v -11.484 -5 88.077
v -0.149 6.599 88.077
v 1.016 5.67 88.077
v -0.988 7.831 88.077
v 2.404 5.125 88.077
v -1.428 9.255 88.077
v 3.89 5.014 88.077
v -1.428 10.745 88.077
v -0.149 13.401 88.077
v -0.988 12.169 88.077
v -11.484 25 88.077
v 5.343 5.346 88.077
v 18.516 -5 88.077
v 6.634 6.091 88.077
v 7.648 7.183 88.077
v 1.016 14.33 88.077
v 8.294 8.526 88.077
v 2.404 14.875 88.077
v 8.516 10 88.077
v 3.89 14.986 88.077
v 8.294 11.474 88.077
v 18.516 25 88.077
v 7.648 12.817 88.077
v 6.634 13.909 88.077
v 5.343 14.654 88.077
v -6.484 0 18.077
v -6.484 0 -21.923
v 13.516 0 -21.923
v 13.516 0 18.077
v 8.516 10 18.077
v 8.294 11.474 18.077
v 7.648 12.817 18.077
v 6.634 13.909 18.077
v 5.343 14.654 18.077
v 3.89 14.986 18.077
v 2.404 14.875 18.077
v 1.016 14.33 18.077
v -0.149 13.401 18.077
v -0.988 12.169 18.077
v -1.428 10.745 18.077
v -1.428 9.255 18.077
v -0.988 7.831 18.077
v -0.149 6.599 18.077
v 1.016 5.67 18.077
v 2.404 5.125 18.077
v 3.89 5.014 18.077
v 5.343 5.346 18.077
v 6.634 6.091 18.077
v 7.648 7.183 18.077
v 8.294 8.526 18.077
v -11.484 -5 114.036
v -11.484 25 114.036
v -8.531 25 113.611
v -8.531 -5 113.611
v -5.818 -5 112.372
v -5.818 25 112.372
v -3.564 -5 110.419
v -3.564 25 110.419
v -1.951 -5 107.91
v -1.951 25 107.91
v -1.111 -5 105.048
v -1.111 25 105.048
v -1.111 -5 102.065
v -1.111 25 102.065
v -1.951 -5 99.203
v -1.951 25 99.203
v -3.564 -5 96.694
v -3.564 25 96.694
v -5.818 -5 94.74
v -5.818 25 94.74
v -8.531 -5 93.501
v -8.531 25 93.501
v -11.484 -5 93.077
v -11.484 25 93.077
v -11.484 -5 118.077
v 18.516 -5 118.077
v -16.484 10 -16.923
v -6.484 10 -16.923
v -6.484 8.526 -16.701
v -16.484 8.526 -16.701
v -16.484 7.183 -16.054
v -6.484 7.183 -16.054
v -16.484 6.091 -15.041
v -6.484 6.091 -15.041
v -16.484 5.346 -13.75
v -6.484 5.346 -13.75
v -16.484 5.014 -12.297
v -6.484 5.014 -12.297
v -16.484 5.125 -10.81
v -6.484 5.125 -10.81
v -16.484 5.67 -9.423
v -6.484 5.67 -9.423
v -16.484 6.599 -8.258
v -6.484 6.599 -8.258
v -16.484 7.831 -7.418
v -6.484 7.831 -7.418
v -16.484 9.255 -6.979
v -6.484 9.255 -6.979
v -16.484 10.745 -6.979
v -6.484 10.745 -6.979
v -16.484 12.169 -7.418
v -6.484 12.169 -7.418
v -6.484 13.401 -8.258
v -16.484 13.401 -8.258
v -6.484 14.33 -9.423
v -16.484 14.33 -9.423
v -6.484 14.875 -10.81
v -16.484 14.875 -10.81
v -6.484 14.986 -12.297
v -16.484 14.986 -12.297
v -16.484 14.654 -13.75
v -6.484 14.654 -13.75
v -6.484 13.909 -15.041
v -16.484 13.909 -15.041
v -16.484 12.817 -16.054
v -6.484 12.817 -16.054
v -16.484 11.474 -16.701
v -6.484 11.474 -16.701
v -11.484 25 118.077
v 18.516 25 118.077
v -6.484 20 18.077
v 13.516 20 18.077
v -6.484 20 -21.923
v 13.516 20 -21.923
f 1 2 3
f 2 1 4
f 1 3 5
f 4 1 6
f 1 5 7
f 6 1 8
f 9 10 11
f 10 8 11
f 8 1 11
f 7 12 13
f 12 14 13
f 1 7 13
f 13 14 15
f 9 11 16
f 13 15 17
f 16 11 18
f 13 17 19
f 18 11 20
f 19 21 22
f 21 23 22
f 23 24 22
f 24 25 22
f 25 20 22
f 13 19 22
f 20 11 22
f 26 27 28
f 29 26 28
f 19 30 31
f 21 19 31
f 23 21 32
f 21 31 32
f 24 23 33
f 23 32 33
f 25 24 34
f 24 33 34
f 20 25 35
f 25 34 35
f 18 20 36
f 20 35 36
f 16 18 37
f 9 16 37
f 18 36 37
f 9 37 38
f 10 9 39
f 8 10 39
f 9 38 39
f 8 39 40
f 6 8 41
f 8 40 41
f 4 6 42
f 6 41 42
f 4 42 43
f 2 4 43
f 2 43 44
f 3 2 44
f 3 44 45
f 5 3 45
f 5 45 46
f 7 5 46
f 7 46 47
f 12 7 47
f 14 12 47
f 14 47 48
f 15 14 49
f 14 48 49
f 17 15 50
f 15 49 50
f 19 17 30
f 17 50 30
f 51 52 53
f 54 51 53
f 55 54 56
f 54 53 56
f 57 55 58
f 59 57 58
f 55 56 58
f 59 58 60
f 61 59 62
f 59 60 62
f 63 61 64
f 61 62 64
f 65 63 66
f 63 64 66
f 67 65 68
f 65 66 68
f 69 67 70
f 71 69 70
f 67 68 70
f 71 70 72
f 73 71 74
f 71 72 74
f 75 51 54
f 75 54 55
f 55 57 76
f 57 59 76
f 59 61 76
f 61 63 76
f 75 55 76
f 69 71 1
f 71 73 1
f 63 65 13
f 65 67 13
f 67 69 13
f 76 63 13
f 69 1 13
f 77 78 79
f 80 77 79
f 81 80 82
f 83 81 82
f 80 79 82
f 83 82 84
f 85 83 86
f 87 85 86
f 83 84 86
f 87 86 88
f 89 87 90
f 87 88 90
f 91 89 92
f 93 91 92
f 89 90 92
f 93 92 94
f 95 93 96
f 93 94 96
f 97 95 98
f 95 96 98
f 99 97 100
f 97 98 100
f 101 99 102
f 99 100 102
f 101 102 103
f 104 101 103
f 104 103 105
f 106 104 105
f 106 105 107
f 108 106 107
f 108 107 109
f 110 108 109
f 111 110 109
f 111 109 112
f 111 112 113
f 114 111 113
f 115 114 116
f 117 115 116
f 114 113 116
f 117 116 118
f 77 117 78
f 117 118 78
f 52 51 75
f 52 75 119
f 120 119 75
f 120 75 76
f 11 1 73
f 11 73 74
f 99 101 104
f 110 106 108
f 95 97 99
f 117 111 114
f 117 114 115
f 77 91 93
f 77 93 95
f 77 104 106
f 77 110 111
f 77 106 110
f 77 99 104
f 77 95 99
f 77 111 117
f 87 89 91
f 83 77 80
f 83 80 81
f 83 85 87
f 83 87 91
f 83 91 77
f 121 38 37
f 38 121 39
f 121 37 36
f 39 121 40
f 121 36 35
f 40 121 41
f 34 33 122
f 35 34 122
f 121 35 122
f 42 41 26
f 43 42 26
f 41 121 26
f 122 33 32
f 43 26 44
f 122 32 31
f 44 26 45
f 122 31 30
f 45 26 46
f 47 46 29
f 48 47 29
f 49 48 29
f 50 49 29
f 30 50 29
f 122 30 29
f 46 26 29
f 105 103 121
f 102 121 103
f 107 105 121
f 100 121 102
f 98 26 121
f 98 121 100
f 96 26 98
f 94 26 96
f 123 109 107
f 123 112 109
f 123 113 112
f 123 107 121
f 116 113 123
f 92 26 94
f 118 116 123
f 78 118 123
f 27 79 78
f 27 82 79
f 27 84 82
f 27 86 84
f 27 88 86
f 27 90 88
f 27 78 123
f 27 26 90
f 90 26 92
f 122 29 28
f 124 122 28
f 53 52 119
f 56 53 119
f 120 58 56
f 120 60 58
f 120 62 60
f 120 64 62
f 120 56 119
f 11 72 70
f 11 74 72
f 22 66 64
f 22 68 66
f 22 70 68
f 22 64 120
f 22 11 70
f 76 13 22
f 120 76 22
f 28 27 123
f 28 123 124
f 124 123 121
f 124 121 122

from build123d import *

# Parameters (mm, degrees)
SKETCH1_W           = 20
SKETCH1_H           = 40
BOSS_EXTRUDE1_DEPTH = 20
SKETCH2_R           = 5
BOSS_EXTRUDE2_DEPTH = 10
SKETCH3_R           = 5
BOSS_EXTRUDE3_DEPTH = 70
SKETCH4_W           = 30
SKETCH4_H           = 30
BOSS_EXTRUDE4_DEPTH = 30
CUT_EXTRUDE1_DEPTH  = 30


with BuildPart() as part:
    # Sketch1 → Boss-Extrude1 (new body)
    with BuildSketch(Plane(origin=(0, 0, 0), x_dir=(1, 0, 0), z_dir=(0, 1, 0))):
        with Locations((3.516483516, 1.923076923)):
            Rectangle(SKETCH1_W, SKETCH1_H)
    extrude(amount=BOSS_EXTRUDE1_DEPTH)

    # Sketch2 → Boss-Extrude2 (add)
    with BuildSketch(Plane.ZY.offset(6.483516484)):
        with Locations(Location((-11.923076923, 10, 0), (0, 0, 180))):
            Circle(SKETCH2_R)
    extrude(amount=BOSS_EXTRUDE2_DEPTH)

    # Sketch3 → Boss-Extrude3 (add)
    with BuildSketch(Plane.XY.offset(18.076923077)):
        with Locations((3.516483516, 10)):
            Circle(SKETCH3_R)
    extrude(amount=BOSS_EXTRUDE3_DEPTH)

    # Sketch4 → Boss-Extrude4 (add)
    with BuildSketch(Plane.XY.offset(88.076923077)):
        with Locations((3.516483516, 10)):
            Rectangle(SKETCH4_W, SKETCH4_H)
    extrude(amount=BOSS_EXTRUDE4_DEPTH)

    # Sketch7 → Cut-Extrude1 (cut)
    with BuildSketch(Plane(origin=(0, 25, 0), x_dir=(1, 0, 0), z_dir=(0, 1, 0))):
        with BuildLine():
            ThreePointArc((-11.483516484, -114.035823302), (-1.004066371, -103.55637319), (-11.483516484, -93.076923077))
            Line((-11.483516484, -93.076923077), (-11.483516484, -114.035823302))
        make_face()
    extrude(amount=-CUT_EXTRUDE1_DEPTH, mode=Mode.SUBTRACT)


solid = part.part
